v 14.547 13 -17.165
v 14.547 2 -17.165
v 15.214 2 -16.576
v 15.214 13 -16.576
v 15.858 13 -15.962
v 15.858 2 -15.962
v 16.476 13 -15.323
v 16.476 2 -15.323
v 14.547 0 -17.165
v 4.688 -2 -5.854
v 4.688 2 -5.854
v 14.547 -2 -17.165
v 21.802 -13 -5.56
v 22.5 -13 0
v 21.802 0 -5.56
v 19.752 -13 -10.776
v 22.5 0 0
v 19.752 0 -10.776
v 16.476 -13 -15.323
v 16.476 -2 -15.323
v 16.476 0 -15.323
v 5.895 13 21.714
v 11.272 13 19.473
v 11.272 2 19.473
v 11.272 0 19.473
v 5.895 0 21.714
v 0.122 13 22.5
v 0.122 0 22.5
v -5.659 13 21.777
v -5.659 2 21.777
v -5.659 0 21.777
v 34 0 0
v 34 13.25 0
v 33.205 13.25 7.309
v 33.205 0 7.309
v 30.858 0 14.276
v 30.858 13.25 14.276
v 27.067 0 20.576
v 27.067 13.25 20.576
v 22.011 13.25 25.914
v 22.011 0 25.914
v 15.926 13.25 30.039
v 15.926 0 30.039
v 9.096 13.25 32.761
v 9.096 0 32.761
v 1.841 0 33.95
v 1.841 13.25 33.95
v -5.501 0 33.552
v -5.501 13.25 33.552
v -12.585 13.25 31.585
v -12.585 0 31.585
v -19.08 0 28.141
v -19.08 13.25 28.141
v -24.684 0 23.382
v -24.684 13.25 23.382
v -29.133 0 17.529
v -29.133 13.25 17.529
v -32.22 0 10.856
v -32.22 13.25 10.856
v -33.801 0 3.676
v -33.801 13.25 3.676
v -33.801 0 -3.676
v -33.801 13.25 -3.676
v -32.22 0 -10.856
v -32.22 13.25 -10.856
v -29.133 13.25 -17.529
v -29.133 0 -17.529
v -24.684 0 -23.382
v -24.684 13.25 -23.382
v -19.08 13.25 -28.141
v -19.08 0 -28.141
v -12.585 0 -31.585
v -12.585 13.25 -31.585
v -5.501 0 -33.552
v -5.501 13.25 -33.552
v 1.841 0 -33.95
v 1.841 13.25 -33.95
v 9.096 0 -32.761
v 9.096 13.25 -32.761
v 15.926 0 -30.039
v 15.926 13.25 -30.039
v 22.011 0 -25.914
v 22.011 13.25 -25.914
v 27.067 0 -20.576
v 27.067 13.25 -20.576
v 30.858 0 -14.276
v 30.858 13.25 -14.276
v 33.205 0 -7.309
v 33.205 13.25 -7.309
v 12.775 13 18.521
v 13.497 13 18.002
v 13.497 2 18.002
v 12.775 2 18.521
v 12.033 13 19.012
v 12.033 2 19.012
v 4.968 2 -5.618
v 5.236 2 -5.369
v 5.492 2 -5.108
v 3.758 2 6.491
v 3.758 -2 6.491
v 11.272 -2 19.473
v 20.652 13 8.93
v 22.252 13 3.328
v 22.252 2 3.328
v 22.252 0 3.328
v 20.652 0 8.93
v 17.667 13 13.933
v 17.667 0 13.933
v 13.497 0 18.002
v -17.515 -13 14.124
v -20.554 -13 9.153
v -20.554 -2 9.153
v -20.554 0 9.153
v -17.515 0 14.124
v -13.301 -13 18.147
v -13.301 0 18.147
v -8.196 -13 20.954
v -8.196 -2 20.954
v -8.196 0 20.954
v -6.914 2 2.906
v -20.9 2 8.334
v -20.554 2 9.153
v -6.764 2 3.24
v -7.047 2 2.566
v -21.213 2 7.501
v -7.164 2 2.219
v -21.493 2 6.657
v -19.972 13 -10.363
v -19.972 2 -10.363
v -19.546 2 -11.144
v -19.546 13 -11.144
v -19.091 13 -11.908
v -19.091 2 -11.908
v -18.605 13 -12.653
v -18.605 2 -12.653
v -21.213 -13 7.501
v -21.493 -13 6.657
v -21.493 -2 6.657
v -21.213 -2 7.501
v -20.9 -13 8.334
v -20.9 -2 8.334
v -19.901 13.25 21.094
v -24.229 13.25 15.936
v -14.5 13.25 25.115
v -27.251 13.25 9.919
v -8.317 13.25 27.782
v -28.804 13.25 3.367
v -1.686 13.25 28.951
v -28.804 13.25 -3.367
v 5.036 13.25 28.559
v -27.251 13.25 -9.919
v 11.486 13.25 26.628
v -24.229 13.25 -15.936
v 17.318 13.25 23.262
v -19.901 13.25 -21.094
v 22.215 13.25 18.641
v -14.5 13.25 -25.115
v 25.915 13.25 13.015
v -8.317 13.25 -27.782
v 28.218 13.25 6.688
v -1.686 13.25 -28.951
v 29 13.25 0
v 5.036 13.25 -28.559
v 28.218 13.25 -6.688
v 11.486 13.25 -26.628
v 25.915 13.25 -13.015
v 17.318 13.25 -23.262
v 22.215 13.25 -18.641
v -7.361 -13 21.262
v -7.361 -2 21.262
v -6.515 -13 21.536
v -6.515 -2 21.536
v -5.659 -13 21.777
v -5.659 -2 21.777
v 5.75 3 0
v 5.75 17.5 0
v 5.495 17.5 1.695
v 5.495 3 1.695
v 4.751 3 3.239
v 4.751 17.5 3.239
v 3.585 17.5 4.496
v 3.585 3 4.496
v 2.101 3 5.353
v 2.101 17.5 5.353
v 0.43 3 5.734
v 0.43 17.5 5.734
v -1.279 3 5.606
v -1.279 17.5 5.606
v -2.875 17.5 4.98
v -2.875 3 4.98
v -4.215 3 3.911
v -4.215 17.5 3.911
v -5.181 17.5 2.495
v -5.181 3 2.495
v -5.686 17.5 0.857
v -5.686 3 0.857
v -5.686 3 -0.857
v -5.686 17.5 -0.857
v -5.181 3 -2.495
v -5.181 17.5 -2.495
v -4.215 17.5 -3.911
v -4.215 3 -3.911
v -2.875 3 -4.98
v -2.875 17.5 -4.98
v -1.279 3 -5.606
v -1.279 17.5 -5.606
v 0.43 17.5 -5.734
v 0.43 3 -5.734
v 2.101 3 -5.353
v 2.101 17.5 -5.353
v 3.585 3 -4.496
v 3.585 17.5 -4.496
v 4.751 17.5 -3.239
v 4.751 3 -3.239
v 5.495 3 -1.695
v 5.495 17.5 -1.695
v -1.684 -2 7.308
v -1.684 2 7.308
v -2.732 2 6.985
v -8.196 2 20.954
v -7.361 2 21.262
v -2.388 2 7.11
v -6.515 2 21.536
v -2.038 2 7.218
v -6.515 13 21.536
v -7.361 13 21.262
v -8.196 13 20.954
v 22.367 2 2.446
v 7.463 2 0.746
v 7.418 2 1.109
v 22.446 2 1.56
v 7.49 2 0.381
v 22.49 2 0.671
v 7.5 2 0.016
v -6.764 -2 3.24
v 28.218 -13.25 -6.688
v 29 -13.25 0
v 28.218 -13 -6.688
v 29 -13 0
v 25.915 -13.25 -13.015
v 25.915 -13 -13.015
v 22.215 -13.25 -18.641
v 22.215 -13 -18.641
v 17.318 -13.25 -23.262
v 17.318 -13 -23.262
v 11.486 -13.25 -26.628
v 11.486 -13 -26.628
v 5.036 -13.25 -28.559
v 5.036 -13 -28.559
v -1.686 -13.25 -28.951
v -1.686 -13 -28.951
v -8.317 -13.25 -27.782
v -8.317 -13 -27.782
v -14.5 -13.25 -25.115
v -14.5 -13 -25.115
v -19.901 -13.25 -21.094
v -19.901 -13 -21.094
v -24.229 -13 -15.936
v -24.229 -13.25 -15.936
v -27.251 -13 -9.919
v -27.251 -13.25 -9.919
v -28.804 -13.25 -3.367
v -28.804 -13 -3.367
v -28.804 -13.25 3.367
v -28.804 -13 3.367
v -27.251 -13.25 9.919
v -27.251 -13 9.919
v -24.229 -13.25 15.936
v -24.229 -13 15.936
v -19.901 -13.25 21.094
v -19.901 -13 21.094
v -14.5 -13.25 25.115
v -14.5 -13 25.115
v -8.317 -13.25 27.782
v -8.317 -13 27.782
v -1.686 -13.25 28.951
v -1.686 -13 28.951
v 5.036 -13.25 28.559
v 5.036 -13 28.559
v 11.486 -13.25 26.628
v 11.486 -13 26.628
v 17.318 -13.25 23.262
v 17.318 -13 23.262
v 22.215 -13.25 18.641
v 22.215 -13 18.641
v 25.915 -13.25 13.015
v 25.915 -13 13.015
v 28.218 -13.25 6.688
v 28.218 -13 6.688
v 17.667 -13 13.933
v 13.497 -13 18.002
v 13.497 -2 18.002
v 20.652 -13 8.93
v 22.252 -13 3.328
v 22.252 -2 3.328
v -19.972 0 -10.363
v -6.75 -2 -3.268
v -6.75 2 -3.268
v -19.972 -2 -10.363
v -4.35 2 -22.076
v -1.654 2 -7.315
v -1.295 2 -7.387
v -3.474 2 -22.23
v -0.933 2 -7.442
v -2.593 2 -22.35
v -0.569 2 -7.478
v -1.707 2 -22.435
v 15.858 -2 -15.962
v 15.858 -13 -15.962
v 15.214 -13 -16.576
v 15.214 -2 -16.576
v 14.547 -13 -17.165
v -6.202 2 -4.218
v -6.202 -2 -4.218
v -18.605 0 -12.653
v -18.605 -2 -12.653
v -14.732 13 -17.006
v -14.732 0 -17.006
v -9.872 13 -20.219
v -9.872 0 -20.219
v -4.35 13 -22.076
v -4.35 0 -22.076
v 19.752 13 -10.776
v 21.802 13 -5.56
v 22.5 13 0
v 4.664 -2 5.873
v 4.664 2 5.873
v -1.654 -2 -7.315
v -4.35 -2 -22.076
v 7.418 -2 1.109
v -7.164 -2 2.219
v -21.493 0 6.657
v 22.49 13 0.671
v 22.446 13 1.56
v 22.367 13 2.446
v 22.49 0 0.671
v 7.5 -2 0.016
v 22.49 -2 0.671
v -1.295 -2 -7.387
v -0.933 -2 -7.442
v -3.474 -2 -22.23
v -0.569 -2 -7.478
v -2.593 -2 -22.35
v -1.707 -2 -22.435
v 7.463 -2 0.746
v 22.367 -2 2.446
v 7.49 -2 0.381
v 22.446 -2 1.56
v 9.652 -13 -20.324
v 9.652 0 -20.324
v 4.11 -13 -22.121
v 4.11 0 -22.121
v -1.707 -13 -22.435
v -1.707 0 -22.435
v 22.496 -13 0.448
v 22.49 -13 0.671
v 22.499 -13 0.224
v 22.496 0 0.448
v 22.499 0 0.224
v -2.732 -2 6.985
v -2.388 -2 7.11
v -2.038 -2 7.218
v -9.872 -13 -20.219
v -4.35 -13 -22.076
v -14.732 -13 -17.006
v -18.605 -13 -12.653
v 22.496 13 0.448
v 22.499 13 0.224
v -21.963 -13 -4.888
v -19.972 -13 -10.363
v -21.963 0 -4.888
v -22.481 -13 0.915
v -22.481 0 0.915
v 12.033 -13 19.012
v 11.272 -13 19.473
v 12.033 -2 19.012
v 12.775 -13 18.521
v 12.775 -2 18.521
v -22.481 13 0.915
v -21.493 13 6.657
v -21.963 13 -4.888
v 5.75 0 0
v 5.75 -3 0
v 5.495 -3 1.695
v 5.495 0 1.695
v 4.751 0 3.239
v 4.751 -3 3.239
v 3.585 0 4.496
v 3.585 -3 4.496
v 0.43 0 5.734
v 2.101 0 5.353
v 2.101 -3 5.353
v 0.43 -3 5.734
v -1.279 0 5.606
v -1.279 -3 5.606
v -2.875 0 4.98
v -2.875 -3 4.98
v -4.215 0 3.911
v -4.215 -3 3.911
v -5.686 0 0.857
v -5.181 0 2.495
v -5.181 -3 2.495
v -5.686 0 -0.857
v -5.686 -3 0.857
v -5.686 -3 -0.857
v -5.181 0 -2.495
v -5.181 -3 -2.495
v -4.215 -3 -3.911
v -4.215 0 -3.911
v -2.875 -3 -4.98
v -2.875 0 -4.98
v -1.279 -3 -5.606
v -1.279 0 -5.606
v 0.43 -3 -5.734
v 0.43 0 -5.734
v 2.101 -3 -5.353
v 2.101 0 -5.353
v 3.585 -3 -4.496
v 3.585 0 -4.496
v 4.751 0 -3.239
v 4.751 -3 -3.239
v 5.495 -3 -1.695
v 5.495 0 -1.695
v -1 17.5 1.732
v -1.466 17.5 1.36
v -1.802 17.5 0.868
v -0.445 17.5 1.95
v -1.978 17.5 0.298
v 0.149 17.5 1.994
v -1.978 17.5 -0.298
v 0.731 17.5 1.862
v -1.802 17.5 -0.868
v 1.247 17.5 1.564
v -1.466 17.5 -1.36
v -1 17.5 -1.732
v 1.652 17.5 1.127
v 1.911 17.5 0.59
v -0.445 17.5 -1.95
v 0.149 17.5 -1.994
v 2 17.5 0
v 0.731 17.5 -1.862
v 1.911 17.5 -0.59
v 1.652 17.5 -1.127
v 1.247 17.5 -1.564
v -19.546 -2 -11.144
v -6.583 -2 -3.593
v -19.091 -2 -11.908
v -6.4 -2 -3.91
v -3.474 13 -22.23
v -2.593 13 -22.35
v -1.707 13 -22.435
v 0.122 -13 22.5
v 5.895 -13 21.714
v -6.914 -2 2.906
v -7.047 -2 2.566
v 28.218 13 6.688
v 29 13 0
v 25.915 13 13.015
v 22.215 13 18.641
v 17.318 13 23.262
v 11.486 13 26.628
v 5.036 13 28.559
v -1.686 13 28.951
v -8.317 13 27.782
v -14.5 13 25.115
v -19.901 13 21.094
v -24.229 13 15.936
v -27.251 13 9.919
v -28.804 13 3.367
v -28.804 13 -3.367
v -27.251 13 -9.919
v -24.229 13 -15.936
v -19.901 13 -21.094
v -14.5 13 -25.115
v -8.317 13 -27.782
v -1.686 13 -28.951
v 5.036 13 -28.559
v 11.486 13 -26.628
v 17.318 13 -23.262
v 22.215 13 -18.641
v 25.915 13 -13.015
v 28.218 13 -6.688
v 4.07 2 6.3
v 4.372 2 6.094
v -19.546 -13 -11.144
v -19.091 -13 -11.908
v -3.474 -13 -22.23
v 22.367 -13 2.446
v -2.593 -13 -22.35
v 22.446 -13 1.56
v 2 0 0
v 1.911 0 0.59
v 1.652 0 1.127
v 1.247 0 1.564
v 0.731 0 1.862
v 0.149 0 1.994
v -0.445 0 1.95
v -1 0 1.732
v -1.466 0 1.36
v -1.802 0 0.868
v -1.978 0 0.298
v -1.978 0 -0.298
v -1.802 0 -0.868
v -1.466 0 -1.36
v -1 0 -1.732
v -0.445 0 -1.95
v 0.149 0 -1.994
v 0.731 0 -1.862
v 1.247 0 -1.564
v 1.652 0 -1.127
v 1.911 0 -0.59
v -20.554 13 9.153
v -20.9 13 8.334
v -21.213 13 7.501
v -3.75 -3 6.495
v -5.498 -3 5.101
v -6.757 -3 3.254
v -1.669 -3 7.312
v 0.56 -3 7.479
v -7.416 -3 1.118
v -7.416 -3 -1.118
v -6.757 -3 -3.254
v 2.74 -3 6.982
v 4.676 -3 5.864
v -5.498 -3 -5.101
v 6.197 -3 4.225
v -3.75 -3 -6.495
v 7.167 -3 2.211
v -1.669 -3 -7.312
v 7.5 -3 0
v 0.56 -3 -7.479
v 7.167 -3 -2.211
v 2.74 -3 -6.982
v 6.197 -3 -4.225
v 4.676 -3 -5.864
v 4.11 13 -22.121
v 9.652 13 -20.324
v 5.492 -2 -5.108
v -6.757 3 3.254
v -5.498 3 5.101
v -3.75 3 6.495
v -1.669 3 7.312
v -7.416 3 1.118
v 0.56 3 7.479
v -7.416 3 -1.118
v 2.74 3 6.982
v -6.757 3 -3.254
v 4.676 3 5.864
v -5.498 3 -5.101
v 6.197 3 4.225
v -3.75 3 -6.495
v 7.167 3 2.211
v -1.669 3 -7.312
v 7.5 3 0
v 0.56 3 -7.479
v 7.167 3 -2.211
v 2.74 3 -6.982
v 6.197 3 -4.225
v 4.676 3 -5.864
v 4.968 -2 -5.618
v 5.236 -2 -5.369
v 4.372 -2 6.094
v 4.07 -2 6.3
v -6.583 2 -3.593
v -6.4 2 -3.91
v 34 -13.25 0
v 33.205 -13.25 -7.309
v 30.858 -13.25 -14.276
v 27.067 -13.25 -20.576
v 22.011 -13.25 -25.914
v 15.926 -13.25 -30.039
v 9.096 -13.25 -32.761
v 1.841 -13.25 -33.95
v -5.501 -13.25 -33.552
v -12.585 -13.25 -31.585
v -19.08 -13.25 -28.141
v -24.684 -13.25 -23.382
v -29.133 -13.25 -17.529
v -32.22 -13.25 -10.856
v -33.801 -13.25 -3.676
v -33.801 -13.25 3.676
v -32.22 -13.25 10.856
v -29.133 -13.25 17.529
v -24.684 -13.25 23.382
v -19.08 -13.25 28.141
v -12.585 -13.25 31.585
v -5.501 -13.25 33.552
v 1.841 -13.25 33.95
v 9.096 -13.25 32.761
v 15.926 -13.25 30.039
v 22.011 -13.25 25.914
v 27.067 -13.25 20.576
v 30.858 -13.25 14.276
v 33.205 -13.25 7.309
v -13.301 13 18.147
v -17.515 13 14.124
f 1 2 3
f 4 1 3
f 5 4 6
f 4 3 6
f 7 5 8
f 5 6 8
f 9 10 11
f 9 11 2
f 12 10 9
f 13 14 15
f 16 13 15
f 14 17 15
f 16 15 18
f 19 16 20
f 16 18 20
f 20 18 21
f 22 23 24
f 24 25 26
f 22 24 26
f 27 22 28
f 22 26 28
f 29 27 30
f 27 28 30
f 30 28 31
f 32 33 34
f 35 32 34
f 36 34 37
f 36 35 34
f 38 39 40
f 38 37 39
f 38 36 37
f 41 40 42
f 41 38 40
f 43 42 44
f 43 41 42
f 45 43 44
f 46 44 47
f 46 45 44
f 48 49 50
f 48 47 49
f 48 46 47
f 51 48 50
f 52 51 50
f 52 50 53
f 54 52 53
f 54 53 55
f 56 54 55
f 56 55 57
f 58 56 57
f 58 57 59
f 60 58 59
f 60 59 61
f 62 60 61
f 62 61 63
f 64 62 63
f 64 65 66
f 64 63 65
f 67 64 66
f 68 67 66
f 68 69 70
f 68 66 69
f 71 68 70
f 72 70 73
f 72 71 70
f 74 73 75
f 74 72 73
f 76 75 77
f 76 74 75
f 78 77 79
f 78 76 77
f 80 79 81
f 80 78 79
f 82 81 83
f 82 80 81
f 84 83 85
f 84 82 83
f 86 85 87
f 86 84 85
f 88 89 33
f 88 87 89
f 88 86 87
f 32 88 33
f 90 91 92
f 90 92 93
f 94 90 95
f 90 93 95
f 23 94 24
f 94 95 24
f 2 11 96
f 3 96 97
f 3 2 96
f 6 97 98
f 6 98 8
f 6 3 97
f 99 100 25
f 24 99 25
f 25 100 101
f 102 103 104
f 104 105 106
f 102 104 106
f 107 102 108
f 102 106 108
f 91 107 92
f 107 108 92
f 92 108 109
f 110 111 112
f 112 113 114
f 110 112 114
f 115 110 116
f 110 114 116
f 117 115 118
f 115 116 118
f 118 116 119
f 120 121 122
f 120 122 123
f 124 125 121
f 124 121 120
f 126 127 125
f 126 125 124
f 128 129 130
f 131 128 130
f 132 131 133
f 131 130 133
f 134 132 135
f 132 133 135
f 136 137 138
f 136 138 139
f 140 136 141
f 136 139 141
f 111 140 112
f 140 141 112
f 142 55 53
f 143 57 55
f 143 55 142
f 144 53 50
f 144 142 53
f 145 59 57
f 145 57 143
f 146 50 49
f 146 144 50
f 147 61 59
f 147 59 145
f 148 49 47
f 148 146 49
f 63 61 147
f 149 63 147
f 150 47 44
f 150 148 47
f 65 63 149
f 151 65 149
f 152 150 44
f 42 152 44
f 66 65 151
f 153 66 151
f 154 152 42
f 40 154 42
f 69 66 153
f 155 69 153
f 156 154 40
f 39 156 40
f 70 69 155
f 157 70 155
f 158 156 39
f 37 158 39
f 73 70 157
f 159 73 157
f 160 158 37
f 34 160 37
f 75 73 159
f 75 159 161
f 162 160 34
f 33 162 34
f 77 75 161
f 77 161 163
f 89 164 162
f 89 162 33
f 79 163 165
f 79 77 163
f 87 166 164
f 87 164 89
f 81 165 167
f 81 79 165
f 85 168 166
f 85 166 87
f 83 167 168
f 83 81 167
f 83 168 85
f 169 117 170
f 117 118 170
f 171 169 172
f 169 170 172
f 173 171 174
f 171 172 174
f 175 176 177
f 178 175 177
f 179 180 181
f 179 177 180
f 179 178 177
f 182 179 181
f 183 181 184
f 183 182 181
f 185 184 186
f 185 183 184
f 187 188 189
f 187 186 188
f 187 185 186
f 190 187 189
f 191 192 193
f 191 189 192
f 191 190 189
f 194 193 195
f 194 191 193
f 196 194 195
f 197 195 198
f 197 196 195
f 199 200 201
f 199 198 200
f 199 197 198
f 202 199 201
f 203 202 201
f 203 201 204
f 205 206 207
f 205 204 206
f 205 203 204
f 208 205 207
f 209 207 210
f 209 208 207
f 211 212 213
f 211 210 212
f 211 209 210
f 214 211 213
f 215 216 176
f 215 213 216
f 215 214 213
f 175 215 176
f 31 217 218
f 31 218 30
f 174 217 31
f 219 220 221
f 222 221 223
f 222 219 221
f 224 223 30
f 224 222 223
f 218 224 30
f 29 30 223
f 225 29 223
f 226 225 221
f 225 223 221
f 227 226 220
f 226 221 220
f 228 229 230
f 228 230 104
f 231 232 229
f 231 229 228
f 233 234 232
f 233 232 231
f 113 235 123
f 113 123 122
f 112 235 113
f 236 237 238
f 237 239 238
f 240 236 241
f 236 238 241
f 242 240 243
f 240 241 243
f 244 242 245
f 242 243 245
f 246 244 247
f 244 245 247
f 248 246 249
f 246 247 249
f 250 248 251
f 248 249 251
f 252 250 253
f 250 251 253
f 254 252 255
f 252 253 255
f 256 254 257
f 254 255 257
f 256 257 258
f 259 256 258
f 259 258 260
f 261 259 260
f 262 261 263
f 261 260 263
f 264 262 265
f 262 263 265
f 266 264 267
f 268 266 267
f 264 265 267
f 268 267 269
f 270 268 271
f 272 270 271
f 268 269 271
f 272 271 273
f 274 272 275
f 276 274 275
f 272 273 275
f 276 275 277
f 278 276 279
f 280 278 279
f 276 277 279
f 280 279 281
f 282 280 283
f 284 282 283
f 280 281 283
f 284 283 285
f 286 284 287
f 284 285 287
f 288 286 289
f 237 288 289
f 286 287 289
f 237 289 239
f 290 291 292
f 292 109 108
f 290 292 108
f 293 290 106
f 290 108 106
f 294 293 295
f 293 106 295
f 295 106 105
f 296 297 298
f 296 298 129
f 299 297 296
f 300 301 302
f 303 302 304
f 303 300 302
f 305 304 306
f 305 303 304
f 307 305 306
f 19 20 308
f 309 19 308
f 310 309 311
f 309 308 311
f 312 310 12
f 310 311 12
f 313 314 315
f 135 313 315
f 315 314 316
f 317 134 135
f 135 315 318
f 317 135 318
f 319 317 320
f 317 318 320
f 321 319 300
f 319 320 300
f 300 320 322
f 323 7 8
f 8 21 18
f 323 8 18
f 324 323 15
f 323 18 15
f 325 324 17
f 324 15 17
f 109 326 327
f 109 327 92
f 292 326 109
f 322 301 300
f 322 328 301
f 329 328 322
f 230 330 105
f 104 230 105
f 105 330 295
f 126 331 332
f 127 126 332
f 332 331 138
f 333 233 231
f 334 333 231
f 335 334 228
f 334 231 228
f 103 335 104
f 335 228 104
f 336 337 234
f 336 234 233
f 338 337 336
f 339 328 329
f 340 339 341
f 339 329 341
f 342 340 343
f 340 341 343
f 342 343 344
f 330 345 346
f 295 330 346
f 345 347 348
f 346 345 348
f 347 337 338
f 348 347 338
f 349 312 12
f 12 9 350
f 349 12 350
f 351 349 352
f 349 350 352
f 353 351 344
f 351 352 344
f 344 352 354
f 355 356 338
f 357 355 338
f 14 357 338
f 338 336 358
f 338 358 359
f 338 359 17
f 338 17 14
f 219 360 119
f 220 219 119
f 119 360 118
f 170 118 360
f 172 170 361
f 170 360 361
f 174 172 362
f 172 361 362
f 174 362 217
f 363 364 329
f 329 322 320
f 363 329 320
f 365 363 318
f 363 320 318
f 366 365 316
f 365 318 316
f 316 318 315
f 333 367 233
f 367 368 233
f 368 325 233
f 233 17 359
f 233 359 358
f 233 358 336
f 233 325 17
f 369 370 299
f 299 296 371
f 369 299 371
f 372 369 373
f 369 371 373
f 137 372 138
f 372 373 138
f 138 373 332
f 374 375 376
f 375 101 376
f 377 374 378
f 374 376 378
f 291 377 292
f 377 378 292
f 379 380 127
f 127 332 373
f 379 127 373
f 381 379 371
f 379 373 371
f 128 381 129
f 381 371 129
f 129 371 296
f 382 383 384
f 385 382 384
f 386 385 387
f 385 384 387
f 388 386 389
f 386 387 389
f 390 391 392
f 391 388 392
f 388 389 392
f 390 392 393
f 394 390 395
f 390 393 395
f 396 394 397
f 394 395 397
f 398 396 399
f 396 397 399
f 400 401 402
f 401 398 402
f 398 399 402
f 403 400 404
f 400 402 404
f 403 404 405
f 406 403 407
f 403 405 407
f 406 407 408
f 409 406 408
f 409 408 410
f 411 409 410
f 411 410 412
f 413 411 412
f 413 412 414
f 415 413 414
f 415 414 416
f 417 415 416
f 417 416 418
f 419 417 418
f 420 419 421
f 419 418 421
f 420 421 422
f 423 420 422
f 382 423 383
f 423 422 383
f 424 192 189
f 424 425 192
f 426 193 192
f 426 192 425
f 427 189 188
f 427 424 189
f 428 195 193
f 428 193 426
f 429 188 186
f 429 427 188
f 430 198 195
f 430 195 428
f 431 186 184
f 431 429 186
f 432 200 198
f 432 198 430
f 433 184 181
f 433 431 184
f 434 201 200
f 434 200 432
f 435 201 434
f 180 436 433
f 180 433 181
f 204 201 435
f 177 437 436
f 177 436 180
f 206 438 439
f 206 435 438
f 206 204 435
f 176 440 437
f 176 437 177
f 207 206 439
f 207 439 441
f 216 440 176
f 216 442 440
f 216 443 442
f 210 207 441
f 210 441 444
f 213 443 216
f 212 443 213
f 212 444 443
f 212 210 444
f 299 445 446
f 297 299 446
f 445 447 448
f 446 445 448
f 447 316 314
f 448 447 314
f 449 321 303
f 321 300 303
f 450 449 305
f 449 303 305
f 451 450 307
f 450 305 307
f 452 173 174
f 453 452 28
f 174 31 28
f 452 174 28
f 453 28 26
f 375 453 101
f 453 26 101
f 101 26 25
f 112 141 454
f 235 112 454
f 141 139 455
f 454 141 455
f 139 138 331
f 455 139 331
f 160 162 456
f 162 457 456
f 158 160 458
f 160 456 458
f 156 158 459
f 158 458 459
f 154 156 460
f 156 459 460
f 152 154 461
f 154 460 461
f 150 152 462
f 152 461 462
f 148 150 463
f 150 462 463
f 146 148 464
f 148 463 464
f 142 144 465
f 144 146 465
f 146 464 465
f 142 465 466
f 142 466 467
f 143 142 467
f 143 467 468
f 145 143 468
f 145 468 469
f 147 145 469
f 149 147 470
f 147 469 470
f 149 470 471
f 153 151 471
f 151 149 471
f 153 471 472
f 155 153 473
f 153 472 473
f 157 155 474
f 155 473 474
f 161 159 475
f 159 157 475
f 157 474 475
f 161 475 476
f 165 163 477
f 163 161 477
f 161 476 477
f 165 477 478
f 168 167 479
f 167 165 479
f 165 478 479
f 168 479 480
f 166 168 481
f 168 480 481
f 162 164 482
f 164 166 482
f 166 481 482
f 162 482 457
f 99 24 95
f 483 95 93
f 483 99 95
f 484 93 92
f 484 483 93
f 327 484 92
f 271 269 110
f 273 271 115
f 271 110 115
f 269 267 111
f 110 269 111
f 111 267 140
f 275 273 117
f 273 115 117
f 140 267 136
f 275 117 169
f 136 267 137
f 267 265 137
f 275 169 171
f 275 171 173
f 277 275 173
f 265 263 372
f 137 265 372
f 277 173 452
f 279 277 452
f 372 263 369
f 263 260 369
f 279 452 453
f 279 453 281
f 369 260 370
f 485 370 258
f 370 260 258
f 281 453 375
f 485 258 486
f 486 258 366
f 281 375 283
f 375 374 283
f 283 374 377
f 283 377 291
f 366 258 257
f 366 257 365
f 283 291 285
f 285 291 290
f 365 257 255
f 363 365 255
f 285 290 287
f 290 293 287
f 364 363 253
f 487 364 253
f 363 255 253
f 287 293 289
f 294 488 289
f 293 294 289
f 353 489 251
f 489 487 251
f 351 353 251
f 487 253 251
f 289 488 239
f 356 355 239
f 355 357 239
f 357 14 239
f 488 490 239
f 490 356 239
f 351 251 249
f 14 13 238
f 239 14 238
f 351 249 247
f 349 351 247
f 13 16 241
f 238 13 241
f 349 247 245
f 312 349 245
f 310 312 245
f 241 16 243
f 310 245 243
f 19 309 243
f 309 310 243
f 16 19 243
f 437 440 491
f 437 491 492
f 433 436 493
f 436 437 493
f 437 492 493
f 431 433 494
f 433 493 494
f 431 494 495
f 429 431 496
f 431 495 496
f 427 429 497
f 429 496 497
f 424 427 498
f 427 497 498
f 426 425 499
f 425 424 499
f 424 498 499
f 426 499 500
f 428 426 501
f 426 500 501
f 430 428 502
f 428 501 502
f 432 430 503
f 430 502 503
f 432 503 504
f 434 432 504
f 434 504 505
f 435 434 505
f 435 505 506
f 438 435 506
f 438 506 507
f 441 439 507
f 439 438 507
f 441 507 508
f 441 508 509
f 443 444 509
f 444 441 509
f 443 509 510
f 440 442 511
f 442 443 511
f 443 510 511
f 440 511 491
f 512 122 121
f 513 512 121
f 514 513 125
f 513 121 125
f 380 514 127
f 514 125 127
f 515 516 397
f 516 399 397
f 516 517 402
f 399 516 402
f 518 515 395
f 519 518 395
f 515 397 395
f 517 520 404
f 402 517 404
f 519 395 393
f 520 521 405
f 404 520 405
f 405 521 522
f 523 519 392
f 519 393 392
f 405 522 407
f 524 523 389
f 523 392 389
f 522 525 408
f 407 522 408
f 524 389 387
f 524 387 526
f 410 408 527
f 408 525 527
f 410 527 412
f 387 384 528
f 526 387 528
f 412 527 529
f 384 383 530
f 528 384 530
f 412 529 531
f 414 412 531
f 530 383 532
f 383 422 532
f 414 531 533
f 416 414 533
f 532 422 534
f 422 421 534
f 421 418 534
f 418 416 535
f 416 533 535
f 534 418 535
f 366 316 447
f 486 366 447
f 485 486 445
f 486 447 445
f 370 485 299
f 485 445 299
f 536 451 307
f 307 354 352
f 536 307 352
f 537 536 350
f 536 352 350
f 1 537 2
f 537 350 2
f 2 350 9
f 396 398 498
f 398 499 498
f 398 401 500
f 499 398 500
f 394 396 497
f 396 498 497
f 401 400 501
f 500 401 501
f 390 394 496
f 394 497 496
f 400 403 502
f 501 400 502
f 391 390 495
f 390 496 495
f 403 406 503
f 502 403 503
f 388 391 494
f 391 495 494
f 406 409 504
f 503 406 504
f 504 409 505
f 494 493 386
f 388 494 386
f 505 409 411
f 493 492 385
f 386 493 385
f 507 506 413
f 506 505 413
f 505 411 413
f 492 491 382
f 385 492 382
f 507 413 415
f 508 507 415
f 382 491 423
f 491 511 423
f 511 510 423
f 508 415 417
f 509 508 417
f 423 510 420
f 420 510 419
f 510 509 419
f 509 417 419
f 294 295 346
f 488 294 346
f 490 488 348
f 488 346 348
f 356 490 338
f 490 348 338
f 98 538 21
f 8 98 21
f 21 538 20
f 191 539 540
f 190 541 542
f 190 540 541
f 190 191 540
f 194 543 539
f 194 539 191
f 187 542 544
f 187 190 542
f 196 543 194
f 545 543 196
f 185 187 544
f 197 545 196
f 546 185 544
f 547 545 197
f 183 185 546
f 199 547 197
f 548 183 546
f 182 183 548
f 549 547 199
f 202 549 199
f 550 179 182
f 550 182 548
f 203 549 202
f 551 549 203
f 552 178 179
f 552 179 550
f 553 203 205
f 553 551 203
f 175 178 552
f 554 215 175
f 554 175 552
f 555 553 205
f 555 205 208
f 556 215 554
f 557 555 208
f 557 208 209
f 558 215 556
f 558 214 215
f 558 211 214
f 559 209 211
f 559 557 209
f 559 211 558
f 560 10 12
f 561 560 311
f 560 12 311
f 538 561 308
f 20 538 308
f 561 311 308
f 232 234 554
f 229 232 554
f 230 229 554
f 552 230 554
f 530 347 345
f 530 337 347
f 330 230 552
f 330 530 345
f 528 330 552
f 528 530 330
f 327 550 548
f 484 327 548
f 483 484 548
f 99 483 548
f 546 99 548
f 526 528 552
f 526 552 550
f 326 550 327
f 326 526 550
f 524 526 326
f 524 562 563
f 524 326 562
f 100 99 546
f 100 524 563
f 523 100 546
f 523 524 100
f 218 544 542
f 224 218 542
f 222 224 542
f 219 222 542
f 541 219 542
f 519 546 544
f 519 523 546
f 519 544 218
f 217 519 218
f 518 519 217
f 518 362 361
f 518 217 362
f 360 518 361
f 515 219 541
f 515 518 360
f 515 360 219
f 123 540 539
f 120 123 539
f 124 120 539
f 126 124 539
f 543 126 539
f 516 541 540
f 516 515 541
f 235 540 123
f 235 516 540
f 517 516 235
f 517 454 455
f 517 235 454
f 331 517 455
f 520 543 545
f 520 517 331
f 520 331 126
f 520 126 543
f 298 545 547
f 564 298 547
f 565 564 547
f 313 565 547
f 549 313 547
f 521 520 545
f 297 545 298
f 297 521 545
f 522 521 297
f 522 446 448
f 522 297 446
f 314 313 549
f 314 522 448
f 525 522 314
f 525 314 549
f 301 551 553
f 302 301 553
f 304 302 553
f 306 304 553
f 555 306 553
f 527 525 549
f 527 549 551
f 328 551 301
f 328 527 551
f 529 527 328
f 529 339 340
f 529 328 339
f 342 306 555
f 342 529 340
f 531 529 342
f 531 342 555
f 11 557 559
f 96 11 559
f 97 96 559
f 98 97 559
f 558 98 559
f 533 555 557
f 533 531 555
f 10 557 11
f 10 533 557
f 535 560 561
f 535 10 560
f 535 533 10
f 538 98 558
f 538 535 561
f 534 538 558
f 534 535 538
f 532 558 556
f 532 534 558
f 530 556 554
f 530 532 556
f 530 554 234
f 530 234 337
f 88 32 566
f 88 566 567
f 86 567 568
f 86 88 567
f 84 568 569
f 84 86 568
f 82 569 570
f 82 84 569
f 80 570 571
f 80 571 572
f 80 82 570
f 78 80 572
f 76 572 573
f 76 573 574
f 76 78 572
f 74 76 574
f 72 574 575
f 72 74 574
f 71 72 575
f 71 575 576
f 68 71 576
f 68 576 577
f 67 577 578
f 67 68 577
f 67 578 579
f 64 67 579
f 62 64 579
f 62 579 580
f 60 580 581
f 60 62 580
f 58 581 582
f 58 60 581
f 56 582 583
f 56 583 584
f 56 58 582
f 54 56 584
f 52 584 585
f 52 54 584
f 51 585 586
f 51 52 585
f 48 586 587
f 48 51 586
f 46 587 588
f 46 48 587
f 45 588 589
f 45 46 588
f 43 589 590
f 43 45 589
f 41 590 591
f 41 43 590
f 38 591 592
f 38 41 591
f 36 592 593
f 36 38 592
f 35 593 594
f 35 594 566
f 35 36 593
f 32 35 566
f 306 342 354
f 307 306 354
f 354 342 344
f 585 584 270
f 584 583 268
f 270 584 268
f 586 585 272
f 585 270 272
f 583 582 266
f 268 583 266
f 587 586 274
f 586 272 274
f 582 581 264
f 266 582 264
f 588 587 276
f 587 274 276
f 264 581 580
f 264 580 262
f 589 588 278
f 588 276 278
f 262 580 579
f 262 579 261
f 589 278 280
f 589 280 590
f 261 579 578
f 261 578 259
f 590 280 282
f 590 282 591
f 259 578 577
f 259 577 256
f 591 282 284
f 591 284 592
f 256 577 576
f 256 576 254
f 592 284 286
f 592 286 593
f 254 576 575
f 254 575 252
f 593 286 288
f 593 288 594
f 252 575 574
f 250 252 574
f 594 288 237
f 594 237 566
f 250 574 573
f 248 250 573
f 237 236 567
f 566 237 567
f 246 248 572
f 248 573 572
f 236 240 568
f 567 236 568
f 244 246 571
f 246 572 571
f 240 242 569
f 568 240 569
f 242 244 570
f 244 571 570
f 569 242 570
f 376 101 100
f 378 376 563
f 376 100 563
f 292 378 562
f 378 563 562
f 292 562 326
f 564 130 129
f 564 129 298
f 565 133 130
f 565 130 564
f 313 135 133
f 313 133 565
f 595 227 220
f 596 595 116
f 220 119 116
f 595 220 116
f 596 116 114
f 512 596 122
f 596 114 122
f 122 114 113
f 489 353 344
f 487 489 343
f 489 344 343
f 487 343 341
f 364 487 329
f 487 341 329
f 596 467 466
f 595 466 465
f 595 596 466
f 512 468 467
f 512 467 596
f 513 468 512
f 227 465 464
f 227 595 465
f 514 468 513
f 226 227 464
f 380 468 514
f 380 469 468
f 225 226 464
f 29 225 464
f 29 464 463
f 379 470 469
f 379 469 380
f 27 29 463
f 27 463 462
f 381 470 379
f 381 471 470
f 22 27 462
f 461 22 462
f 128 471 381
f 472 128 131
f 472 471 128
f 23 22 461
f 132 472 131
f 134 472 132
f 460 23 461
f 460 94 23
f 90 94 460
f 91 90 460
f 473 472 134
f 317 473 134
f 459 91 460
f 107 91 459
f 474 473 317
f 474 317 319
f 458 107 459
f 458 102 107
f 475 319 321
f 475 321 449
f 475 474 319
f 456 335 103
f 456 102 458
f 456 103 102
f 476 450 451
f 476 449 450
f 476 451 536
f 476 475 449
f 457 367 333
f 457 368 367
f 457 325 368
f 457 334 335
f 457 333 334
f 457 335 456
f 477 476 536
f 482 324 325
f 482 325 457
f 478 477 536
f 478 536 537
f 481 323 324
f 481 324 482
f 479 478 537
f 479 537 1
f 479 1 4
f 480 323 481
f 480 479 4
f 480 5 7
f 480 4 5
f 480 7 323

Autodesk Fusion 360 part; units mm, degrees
sketch "Sketch1" plane through (0, 0, 0) normal (0, 1, 0) x (1, 0, 0)
  circle A0 centre (0, 0) radius 34
  circle A1 centre (0, 0) radius 29
  circle A2 centre (0, 0) radius 22.5
  circle A3 centre (0, 0) radius 5.75
  circle A4 centre (0, 0) radius 2
  circle A5 centre (0, 0) radius 7.5
  line L0 (4.6641, -5.8734) -> (13.4973, -18.002)
  line L1 (3.7575, -6.4909) -> (11.2724, -19.4726)
  line L2 (7.4175, -1.1093) -> (22.2525, -3.3279)
  line L3 (7.5, -0.0155) -> (22.49, -0.6714)
  line L4 (5.492, 5.1076) -> (16.4761, 15.3228)
  line L5 (4.6882, 5.8541) -> (14.5472, 17.1648)
  line L6 (-0.5691, 7.4784) -> (-1.7072, 22.4351)
  line L7 (-1.6538, 7.3154) -> (-4.3499, 22.0755)
  line L8 (-6.2016, 4.2178) -> (-18.6049, 12.6533)
  line L9 (-6.7505, 3.268) -> (-19.9715, 10.363)
  line L10 (-7.1643, -2.2189) -> (-21.4928, -6.6567)
  line L11 (-6.764, -3.2402) -> (-20.5541, -9.1531)
  line L12 (-2.732, -6.9847) -> (-8.1961, -20.9541)
  line L13 (-1.684, -7.3085) -> (-5.6591, -21.7767)
  dimension "d1" = 68
  dimension "d2" = 58
  dimension "d3" = 45
  dimension "d4" = 11.5
  dimension "d5" = 4
  dimension "d6" = 15
  dimension "d8" = 6
  dimension "d10" = 360
extrude "Extrude1" add sketch "Sketch1" along normal blind 17.5 contours A3 makes body 1
extrude "Extrude2" add sketch "Sketch1" along normal mid plane 6 contours A5 bodies 1
extrude "Extrude3" add sketch "Sketch1" along normal mid plane 4 contours A2 A5 L4 L5 | A2 A5 L2 L3 | A2 A5 L6 L7 | A2 A5 L0 L1 | A2 A5 L8 L9 | A2 A5 L12 L13 | A2 A5 L10 L11 bodies 1
extrude "Extrude4" add sketch "Sketch1" along normal mid plane 26.5 separate body contours A0 makes body 2
extrude "Extrude5" add sketch "Sketch1" along normal mid plane 26 contours A1 bodies 1 2
equation "d11 = 3 mm + 14.5 mm"
